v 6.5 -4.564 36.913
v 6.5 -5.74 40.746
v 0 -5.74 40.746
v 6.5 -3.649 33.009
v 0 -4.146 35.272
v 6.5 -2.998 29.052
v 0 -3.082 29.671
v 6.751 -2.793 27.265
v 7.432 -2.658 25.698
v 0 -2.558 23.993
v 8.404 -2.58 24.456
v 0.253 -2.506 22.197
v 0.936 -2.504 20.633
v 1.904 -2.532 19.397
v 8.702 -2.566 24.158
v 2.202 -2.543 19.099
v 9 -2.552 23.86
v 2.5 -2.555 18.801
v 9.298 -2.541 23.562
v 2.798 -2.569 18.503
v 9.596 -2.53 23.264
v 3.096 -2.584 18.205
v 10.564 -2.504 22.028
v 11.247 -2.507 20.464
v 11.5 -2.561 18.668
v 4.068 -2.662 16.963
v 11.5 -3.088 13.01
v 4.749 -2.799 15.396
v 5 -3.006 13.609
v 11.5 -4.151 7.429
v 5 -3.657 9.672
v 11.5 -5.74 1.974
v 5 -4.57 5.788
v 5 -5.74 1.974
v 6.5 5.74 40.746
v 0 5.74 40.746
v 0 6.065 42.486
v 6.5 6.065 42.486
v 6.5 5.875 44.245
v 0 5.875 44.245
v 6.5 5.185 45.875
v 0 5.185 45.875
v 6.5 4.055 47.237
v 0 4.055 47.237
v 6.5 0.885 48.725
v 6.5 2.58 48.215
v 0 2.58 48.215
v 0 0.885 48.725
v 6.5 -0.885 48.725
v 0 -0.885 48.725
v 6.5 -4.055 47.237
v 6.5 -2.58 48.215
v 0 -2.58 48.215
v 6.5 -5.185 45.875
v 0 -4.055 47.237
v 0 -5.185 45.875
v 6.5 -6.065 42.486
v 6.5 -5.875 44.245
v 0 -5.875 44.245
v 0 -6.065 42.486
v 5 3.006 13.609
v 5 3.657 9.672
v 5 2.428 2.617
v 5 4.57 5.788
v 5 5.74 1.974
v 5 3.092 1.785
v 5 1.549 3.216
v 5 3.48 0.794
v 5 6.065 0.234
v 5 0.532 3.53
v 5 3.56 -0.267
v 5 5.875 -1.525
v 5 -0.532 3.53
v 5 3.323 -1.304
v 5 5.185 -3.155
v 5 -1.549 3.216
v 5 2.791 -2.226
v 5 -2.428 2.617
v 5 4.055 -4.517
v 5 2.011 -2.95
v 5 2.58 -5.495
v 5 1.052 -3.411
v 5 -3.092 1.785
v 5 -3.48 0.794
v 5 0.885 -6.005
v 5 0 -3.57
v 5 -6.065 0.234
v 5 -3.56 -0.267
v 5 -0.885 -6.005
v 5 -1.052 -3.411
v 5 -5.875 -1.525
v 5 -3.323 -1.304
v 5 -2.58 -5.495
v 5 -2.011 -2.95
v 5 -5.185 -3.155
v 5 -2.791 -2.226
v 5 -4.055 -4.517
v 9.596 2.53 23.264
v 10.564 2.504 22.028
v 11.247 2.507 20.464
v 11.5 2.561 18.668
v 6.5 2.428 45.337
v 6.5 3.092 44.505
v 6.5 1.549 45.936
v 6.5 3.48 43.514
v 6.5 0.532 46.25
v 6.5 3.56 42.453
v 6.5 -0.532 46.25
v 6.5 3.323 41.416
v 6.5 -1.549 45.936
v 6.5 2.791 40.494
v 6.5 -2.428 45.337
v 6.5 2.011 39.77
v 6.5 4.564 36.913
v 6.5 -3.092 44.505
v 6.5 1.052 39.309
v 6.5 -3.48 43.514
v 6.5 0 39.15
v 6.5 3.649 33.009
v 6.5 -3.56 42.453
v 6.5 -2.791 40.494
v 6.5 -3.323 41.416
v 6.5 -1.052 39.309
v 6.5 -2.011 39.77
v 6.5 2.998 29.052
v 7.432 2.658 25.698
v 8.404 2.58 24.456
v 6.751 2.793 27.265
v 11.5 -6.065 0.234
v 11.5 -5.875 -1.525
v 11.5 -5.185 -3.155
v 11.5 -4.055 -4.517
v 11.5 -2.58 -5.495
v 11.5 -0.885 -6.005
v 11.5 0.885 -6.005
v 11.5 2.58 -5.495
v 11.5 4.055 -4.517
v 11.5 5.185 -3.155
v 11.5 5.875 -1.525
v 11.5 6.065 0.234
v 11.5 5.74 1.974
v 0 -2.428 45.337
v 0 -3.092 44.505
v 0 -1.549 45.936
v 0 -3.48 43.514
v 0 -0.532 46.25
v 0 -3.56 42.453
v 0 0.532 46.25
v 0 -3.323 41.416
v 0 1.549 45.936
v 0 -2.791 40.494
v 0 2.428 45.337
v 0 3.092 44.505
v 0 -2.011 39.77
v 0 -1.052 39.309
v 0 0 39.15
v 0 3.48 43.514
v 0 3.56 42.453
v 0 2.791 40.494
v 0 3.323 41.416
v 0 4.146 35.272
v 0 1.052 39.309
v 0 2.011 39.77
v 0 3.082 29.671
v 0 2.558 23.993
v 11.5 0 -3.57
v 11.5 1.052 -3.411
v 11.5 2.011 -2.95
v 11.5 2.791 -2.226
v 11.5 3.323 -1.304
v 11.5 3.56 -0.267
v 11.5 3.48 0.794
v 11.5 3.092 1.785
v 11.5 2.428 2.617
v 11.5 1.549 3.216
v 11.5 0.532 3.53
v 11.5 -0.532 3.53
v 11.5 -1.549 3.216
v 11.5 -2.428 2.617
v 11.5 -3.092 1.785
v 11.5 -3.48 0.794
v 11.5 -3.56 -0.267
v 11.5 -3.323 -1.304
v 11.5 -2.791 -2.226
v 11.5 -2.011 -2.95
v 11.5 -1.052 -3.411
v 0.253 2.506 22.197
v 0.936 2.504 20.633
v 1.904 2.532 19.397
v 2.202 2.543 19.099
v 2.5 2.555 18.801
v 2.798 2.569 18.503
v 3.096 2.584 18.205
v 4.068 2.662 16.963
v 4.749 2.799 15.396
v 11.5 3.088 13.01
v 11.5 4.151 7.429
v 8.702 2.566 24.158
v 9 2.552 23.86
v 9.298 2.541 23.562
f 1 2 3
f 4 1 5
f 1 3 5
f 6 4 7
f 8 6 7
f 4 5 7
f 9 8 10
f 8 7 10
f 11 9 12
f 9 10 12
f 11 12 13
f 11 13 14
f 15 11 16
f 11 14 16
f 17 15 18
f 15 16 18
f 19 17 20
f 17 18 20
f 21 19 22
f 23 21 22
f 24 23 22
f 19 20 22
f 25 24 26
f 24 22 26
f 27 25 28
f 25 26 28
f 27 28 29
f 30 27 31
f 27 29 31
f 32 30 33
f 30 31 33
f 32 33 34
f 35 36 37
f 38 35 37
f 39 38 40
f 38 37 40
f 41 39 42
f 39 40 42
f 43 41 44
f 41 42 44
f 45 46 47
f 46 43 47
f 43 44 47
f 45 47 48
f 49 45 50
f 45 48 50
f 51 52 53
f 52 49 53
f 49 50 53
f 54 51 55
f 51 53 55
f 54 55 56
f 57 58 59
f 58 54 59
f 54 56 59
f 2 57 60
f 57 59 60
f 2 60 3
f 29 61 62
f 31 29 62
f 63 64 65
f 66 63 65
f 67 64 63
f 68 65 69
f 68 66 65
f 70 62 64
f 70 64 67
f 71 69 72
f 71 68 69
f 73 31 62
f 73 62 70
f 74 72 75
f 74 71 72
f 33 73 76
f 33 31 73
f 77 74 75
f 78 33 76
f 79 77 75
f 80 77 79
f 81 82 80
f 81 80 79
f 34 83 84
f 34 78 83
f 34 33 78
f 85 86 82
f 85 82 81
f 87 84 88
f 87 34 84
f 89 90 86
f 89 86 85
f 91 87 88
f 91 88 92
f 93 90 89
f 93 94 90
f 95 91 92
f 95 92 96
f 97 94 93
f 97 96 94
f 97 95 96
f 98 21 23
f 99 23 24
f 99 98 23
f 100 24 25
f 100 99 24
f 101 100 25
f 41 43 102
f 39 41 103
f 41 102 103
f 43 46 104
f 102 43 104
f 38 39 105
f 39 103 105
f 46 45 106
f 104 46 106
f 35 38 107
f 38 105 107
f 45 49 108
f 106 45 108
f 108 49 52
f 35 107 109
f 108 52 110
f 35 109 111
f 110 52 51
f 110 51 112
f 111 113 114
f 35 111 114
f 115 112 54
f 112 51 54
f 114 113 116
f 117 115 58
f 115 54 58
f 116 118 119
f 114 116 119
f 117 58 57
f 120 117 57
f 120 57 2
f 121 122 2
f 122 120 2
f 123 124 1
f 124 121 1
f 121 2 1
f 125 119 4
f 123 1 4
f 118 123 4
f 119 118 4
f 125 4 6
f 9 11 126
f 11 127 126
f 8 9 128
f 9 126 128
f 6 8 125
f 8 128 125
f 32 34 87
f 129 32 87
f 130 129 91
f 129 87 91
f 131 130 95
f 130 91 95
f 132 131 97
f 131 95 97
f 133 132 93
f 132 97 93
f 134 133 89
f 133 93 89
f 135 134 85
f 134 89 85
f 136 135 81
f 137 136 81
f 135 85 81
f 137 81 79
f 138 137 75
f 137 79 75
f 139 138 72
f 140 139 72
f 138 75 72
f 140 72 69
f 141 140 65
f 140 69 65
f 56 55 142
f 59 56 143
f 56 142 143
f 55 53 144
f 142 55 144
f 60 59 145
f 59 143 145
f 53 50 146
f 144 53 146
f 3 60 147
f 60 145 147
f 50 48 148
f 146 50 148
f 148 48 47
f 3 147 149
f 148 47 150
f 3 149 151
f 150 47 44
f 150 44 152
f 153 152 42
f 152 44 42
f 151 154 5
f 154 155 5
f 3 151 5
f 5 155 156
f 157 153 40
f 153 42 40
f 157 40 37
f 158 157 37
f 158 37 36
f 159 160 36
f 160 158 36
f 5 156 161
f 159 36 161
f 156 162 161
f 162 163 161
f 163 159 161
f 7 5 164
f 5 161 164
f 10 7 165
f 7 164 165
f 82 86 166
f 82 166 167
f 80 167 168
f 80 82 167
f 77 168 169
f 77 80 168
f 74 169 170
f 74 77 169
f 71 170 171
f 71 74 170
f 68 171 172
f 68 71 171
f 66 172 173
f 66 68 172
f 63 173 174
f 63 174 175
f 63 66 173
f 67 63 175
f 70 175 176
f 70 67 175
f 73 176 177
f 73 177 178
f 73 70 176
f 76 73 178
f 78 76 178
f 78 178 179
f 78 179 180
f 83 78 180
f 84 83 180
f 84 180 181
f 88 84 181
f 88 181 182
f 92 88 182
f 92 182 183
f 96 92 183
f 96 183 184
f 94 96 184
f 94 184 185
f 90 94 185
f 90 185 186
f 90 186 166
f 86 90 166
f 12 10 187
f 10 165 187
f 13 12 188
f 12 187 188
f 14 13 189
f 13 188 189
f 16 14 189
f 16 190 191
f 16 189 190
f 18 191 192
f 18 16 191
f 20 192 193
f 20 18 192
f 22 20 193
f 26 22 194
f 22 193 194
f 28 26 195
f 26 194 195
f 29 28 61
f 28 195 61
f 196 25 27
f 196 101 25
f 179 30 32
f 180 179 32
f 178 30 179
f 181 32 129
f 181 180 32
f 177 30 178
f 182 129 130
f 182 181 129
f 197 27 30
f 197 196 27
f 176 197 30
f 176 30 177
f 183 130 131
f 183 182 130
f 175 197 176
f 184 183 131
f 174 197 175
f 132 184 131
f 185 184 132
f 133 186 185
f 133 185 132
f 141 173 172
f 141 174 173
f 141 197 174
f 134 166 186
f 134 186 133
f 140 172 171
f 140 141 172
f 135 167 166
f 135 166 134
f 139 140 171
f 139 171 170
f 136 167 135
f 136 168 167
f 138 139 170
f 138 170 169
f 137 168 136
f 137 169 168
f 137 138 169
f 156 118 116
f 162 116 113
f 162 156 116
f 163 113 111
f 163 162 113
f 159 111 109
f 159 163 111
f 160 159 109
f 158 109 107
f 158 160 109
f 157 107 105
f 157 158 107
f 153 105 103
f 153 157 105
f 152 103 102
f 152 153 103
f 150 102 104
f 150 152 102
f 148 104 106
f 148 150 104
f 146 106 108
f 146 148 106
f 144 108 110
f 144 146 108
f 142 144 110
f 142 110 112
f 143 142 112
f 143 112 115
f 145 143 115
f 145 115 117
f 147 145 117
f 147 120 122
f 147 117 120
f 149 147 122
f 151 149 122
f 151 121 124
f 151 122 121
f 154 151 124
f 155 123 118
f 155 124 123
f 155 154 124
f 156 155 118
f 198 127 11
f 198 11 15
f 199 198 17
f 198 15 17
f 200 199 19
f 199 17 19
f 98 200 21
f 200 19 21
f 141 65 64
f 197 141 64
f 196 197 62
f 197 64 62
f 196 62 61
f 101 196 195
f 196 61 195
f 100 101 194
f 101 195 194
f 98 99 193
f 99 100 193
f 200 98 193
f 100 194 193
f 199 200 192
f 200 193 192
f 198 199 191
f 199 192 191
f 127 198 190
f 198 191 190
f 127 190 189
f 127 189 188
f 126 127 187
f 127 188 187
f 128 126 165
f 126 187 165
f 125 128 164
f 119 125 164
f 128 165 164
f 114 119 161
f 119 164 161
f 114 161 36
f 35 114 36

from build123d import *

# Parameters (mm, degrees)
SKETCH1_R               = 3.57
BOSS_EXTRUDE1_DEPTH     = 11.5
CUT_EXTRUDE2_DEPTH      = 51.493157952
CUT_EXTRUDE2_DEPTH_BACK = 51.493157952
FILLET1_R               = 6.5


with BuildPart() as part:
    # Sketch1 → Boss-Extrude1 (new body)
    with BuildSketch(Plane(origin=(0, 0, 0), x_dir=(0, 0, -1), z_dir=(1, 0, 0))):
        with BuildLine():
            ThreePointArc((-1.973878431, -5.740096161), (6.07, 0), (-1.973878431, 5.740096161))
            ThreePointArc((-1.973878431, 5.740096161), (-21.36, 2.5), (-40.746121569, 5.740096161))
            ThreePointArc((-40.746121569, 5.740096161), (-48.79, 0), (-40.746121569, -5.740096161))
            ThreePointArc((-40.746121569, -5.740096161), (-21.36, -2.5), (-1.973878431, -5.740096161))
        make_face()
        Circle(SKETCH1_R, mode=Mode.SUBTRACT)
        with Locations((-42.72, 0)):
            Circle(SKETCH1_R, mode=Mode.SUBTRACT)
    extrude(amount=BOSS_EXTRUDE1_DEPTH)

    # Sketch2 → Cut-Extrude2 (cut, two sides: drawn at the far end of the back side and taken through both)
    with BuildSketch(Plane(origin=(0, 0, 0), x_dir=(1, 0, 0), z_dir=(0, 1, 0)).offset(-CUT_EXTRUDE2_DEPTH_BACK)):
        Polygon((11.5, -48.79), (6.5, -48.79), (6.5, -26.36), (11.5, -21.36), align=None)
        Polygon((5, -16.30090598), (5, 6.07), (0, 6.07), (0, -21.30090598), align=None)
    extrude(amount=CUT_EXTRUDE2_DEPTH + CUT_EXTRUDE2_DEPTH_BACK, mode=Mode.SUBTRACT)

    # Fillet1
    fillet1_edges = [part.edges().sort_by_distance(p)[0] for p in [
        (0, 0, 21.30090598),
        (5, 0, 16.30090598),
        (6.5, 0, 26.36),
        (11.5, 0, 21.36),
    ]]
    fillet(fillet1_edges, radius=FILLET1_R)


solid = part.part
